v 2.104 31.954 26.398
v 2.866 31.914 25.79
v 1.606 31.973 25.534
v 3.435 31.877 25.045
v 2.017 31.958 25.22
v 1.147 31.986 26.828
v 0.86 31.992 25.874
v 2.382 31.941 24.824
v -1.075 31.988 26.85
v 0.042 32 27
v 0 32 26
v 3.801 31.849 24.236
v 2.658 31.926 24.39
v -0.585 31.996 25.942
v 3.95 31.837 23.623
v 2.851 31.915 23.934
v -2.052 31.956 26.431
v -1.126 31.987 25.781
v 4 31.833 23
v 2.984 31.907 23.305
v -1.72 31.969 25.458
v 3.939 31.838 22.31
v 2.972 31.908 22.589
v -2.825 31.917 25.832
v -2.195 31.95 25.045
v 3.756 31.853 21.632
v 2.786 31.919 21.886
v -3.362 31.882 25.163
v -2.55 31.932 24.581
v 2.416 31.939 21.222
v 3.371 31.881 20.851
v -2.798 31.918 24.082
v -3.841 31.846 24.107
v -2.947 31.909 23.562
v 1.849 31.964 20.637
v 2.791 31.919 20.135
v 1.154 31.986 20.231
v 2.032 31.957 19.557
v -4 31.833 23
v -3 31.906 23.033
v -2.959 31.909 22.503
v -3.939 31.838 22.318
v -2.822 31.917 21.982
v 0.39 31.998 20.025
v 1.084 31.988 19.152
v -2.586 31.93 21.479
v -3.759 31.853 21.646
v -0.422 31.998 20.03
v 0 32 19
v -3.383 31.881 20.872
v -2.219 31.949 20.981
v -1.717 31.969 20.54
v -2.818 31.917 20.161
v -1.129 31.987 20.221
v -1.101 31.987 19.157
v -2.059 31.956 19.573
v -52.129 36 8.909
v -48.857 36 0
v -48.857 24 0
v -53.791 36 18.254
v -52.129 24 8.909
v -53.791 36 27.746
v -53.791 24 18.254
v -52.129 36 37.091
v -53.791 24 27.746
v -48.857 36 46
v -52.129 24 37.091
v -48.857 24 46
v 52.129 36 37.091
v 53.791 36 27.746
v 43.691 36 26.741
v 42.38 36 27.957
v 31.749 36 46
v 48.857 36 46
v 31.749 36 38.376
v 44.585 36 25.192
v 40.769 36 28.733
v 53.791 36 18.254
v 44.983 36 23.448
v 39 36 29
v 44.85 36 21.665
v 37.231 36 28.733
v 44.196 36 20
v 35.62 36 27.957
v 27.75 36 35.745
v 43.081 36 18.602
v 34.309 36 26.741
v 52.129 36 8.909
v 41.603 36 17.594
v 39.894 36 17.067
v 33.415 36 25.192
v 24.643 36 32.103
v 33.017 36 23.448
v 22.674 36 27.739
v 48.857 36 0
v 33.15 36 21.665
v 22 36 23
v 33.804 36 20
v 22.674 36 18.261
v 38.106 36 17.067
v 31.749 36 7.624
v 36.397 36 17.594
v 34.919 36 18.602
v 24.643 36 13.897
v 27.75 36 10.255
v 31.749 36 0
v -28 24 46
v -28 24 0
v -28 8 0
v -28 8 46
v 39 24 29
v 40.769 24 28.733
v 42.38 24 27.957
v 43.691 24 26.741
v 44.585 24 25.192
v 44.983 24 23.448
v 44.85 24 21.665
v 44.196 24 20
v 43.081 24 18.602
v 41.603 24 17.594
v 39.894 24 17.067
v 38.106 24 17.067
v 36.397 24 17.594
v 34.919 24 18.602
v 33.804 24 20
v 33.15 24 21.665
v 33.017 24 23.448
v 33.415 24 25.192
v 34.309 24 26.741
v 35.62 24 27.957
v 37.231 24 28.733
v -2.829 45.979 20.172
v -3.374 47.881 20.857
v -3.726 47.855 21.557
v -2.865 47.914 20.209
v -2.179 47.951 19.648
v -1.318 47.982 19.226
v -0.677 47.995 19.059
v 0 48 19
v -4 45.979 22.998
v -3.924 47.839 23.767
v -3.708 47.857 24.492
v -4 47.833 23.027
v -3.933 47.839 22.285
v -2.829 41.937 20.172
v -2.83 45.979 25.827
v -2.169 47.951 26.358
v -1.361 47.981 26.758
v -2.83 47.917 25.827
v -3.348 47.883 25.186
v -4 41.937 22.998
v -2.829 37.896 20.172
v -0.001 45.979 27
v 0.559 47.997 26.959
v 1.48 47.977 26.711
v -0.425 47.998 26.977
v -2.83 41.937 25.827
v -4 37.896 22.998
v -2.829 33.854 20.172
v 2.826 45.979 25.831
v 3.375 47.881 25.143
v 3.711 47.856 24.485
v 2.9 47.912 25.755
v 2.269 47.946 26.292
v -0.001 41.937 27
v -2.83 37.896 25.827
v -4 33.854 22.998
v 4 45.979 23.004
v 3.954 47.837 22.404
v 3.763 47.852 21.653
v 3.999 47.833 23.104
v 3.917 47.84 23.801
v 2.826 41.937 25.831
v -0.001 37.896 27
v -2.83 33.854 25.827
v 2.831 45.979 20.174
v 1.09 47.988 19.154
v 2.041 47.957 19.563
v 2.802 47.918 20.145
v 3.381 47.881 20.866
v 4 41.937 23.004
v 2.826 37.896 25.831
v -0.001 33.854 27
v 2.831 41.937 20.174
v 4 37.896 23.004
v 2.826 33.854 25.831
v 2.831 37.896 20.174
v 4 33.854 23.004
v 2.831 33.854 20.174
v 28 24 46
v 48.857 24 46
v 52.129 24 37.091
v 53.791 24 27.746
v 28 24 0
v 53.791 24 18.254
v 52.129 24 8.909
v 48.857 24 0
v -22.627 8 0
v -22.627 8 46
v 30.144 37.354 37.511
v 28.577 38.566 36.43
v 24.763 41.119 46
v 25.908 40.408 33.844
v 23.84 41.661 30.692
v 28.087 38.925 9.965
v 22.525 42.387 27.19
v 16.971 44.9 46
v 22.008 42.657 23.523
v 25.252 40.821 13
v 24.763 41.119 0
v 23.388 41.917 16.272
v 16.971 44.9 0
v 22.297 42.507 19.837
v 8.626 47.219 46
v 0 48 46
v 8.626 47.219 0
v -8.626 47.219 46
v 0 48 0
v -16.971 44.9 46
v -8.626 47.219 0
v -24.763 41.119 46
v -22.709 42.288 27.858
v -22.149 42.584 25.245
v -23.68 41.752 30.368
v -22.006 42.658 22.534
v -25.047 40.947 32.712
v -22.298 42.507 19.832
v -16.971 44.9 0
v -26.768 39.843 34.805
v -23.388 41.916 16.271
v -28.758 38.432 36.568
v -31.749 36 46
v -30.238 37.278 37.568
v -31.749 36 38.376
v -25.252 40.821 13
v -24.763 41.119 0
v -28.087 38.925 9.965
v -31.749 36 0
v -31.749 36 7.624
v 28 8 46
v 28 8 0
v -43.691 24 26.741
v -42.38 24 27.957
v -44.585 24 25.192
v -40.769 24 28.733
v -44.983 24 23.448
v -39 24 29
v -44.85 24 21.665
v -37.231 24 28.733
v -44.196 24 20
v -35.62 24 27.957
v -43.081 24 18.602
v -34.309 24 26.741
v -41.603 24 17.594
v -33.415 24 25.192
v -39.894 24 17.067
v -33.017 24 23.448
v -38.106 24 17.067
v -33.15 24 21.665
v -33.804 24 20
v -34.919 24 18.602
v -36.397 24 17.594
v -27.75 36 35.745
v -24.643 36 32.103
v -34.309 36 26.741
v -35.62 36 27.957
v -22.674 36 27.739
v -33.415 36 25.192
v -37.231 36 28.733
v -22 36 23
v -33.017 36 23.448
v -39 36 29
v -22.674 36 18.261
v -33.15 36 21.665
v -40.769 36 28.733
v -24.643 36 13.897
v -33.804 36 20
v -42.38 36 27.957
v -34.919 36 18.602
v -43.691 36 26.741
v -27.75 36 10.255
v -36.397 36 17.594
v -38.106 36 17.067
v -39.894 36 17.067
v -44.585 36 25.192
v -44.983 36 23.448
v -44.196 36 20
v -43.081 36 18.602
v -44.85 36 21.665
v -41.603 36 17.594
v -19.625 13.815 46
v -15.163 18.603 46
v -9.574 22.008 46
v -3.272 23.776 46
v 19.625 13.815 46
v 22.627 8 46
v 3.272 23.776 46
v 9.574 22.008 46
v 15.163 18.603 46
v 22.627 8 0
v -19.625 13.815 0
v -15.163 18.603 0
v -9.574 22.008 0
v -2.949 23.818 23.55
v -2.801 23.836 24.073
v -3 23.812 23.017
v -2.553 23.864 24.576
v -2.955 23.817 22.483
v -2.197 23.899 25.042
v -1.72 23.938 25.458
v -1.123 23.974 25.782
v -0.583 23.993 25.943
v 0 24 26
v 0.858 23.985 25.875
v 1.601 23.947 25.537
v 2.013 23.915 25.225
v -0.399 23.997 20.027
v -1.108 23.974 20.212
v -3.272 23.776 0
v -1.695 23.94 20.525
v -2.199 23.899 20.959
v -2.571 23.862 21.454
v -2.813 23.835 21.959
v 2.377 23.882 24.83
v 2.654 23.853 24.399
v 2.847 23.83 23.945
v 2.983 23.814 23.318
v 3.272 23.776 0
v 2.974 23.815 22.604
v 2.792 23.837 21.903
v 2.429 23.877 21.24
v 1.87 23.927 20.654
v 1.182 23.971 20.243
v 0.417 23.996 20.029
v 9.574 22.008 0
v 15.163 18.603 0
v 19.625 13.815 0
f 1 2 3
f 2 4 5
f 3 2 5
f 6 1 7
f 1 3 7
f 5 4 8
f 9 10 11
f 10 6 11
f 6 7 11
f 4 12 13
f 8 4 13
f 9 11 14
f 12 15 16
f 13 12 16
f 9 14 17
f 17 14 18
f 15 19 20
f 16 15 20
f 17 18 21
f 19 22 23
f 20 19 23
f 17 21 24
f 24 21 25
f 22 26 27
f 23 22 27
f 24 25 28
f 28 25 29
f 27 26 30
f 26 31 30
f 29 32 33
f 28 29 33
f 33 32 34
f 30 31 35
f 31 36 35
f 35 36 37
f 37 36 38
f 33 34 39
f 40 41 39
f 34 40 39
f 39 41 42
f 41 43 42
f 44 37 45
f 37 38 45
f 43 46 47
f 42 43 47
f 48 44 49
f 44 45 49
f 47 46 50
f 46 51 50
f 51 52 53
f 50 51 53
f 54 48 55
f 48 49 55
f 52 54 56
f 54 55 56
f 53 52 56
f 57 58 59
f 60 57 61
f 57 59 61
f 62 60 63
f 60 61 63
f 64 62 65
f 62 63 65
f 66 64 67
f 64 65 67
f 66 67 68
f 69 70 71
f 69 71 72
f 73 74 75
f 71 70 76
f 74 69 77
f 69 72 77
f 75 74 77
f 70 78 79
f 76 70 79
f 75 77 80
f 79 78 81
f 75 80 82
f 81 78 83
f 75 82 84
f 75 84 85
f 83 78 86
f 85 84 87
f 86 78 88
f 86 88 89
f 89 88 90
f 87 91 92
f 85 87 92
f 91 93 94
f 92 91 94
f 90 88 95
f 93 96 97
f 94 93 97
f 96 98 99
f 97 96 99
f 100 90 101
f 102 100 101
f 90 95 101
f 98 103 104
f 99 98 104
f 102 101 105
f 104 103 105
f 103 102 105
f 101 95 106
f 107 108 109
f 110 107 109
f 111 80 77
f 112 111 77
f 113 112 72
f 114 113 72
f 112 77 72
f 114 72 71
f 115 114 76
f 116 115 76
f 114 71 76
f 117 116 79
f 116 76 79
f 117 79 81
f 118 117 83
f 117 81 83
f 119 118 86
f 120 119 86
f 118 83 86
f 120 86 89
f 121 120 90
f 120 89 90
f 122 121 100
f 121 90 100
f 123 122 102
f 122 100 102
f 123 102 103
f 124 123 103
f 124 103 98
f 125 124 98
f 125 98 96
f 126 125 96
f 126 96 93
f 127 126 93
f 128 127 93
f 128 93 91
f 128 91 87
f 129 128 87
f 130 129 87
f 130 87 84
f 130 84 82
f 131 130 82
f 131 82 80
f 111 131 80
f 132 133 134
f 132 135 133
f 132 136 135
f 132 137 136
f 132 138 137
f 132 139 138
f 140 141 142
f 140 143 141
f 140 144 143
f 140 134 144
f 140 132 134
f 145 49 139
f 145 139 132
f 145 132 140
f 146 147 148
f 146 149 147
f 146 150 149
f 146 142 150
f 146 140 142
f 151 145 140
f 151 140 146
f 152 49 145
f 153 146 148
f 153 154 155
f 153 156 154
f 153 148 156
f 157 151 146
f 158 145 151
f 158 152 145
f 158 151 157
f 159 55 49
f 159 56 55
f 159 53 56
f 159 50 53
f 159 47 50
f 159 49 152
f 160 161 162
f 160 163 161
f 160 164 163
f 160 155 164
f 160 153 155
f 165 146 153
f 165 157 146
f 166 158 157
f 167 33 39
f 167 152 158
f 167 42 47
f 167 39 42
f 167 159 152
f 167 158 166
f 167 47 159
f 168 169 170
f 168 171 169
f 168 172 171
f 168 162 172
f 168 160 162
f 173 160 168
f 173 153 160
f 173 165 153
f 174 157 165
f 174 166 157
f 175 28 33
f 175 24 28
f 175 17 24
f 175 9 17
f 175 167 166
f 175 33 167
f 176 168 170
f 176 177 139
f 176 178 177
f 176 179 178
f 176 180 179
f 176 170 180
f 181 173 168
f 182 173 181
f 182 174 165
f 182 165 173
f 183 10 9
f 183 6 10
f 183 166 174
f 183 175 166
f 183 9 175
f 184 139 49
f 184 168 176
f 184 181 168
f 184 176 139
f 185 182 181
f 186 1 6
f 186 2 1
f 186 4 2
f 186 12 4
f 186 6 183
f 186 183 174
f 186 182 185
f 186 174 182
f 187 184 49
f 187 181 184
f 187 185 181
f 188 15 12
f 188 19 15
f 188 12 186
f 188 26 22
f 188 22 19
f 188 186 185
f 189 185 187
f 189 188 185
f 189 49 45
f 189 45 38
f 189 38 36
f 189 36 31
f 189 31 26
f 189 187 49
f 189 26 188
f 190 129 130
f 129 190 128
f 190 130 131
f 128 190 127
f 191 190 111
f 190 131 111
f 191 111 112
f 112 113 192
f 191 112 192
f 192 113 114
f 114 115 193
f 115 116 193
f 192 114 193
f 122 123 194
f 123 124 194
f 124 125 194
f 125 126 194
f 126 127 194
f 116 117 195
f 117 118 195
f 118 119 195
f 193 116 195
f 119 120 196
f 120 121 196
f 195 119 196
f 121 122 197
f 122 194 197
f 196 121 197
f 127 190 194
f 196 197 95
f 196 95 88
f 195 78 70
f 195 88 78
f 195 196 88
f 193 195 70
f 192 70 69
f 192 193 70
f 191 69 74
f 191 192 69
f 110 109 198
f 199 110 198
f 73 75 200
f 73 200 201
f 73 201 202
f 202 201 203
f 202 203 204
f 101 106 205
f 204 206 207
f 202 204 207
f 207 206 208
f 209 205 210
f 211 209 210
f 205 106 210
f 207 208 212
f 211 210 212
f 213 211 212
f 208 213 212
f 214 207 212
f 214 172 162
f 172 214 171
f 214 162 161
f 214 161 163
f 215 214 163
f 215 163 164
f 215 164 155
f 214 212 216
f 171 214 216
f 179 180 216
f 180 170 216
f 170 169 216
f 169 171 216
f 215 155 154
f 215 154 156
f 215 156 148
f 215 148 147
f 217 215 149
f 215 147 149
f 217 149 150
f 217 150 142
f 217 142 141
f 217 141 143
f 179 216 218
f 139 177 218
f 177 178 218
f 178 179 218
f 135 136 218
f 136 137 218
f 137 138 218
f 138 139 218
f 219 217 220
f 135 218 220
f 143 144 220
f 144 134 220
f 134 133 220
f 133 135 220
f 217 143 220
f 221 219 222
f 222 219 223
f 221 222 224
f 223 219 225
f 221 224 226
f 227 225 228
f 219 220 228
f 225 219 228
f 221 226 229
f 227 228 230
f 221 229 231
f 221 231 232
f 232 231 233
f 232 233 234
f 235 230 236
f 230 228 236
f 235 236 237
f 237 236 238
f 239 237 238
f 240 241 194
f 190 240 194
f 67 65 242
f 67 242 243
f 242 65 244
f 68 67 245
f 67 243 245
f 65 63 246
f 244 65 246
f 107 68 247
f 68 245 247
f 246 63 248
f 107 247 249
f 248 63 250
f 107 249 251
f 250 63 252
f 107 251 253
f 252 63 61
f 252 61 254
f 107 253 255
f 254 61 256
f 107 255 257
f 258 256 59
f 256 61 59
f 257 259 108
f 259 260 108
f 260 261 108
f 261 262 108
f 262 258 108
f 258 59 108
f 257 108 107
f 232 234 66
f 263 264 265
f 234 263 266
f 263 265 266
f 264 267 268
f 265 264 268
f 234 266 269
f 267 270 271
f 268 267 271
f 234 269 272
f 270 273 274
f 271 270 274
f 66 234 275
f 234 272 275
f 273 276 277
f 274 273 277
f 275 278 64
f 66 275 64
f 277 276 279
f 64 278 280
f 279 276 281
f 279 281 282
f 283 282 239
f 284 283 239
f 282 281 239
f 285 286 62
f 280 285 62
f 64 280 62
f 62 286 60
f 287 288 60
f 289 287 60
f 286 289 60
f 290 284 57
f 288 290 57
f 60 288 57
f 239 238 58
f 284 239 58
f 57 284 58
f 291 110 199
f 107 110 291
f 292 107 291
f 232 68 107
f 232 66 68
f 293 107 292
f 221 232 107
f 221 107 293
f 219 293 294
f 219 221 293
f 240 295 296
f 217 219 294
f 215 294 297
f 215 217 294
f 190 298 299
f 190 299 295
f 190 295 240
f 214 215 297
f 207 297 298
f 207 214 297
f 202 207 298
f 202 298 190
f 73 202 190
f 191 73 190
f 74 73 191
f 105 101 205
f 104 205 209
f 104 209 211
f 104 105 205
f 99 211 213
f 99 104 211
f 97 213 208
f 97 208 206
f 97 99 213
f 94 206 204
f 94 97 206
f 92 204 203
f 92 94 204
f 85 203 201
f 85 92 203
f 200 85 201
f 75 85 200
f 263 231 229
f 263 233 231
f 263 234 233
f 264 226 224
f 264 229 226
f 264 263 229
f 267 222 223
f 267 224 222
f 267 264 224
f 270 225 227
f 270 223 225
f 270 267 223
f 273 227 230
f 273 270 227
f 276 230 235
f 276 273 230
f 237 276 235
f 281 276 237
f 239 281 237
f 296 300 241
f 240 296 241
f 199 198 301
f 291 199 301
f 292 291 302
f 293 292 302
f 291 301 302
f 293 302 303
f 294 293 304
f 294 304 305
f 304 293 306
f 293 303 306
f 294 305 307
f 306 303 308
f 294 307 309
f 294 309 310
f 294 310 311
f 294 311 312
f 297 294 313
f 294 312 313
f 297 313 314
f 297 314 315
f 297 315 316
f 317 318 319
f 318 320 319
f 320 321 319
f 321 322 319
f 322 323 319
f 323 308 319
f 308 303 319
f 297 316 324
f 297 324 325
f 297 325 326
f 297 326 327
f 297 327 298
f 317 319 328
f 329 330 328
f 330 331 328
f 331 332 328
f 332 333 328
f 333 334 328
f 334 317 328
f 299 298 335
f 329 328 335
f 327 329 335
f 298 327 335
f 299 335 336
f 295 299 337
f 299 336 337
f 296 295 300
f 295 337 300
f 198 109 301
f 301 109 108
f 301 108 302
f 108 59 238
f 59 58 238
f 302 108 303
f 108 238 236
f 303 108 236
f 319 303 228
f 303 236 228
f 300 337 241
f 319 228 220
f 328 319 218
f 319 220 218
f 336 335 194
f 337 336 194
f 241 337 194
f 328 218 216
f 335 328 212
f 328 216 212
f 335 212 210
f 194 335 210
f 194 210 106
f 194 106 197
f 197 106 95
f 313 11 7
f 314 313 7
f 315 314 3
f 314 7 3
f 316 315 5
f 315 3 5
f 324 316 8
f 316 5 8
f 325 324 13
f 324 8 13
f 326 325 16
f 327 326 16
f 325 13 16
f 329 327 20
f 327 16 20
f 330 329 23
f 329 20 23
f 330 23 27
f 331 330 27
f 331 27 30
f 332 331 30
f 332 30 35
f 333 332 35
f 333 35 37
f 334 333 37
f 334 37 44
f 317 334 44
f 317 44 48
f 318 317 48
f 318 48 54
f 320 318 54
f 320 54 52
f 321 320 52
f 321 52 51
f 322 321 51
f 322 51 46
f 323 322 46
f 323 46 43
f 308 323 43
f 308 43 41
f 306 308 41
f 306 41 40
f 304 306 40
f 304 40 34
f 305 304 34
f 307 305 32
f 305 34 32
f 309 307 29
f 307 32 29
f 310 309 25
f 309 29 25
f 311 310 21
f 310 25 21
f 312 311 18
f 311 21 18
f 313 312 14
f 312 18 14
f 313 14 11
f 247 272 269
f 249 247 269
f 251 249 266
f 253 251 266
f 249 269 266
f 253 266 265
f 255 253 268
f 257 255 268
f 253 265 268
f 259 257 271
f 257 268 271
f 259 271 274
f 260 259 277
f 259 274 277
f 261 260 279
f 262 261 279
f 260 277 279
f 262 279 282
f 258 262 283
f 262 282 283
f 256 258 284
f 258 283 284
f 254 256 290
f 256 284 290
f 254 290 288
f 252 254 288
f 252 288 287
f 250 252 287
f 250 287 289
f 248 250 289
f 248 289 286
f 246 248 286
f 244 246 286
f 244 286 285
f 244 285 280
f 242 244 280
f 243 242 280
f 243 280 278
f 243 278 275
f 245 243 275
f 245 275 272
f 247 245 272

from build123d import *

# Parameters (mm, degrees)
BOSS_EXTRUDE1_DEPTH  = 46
CUT_EXTRUDE1_START   = -4.166957121
CUT_EXTRUDE1_DEPTH   = 17.166957121
CUT_EXTRUDE1_START_2 = 18
CUT_EXTRUDE1_2_DEPTH = 10
SKETCH4_R            = 3
CUT_EXTRUDE2_DEPTH   = 77.26270392
SKETCH5_R            = 17
CUT_EXTRUDE3_DEPTH   = 77.262703957
SKETCH6_R            = 6
CUT_EXTRUDE4_DEPTH   = 77.262703957
CUT_EXTRUDE5_DEPTH   = 86.650452531


with BuildPart() as part:
    # Sketch1 → Boss-Extrude1 (new body)
    with BuildSketch(Plane.XY):
        with BuildLine():
            Line((-28, 8), (-22.627416998, 8))
            ThreePointArc((-22.627416998, 8), (0, 24), (22.627416998, 8))
            Line((22.627416998, 8), (28, 8))
            Line((28, 8), (28, 24))
            Line((28, 24), (54, 24))
            Line((54, 24), (54, 36))
            Line((54, 36), (31.749015733, 36))
            ThreePointArc((31.749015733, 36), (0, 48), (-31.749015733, 36))
            Line((-31.749015733, 36), (-54, 36))
            Line((-54, 36), (-54, 24))
            Line((-54, 24), (-28, 24))
            Line((-28, 24), (-28, 8))
        make_face()
    extrude(amount=BOSS_EXTRUDE1_DEPTH)

    # Cut-Extrude1: read off the stored shape, not the designer's step
    # Cut-Extrude1 outline → Cut-Extrude1 (cut)
    with BuildSketch(Plane(origin=(0, 36, 0), x_dir=(1, 0, 0), z_dir=(0, 1, 0)).offset(CUT_EXTRUDE1_START)):
        with BuildLine():
            add(Edge.make_bspline(
                [(0, -19), (-1.057527997, -19), (-2.091087742, -19.434088276), (-3.566323367, -20.909614388), (-3.999433765, -21.953884044), (-4.00056506, -24.04178128), (-3.576219278, -25.07994956), (-2.083227921, -26.574310552), (-1.045821073, -26.9996204), (1.042915307, -27.000379072), (2.087446575, -26.567981834), (3.563947107, -25.094327717), (3.998968512, -24.060310778), (4.001027689, -21.947486084), (3.568016054, -20.912331491), (2.093312914, -19.435292521), (1.057527997, -19), (0, -19)],
                knots=[0, 0, 0, 0, 0.125, 0.125, 0.25, 0.25, 0.375, 0.375, 0.5, 0.5, 0.625, 0.625, 0.75, 0.75, 0.875, 0.875, 1, 1, 1, 1], degree=3))
        make_face()
    extrude(amount=CUT_EXTRUDE1_DEPTH, mode=Mode.SUBTRACT)

    # Cut-Extrude1 2 outline → Cut-Extrude1 2 (add)
    with BuildSketch(Plane.XY.offset(CUT_EXTRUDE1_START_2)):
        with BuildLine():
            ThreePointArc((4.00000004, 31.83304297), (-2.3e-08, 32), (-4.000000085, 31.833042966))
            Line((-4.000000085, 31.833042966), (4.00000004, 31.83304297))
        make_face()
    extrude(amount=CUT_EXTRUDE1_2_DEPTH)

    # Sketch4 → Cut-Extrude2 (cut, through all)
    with BuildSketch(Plane(origin=(0, 36, 0), x_dir=(1, 0, 0), z_dir=(0, 1, 0))):
        with Locations(Location((0, -23, 0), (0, 0, 270))):
            Circle(SKETCH4_R)
    extrude(amount=-CUT_EXTRUDE2_DEPTH, mode=Mode.SUBTRACT)

    # Sketch5 → Cut-Extrude3 (cut, through all)
    with BuildSketch(Plane(origin=(0, 36, 0), x_dir=(1, 0, 0), z_dir=(0, 1, 0))):
        with Locations((-39, -23)):
            Circle(SKETCH5_R)
        with Locations((39, -23)):
            Circle(SKETCH5_R)
    extrude(amount=CUT_EXTRUDE3_DEPTH, mode=Mode.SUBTRACT)

    # Sketch6 → Cut-Extrude4 (cut, through all)
    with BuildSketch(Plane(origin=(0, 36, 0), x_dir=(1, 0, 0), z_dir=(0, 1, 0))):
        with Locations(Location((-39, -23, 0), (0, 0, 270))):
            Circle(SKETCH6_R)
        with Locations(Location((39, -23, 0), (0, 0, 270))):
            Circle(SKETCH6_R)
    extrude(amount=-CUT_EXTRUDE4_DEPTH, mode=Mode.SUBTRACT)

    # Sketch8 → Cut-Extrude5 (cut, through all)
    with BuildSketch(Plane(origin=(0, 0, 0), x_dir=(1, 0, 0), z_dir=(0, 1, 0))):
        with BuildLine():
            Line((-48.61841215, -46.5), (-63.61841215, -46.5))
            Line((-63.61841215, -46.5), (-63.61841215, 0.5))
            Line((-63.61841215, 0.5), (-48.61841215, 0.5))
            ThreePointArc((-48.61841215, 0.5), (-54, -23), (-48.61841215, -46.5))
        make_face()
    cut_extrude5 = extrude(amount=CUT_EXTRUDE5_DEPTH, mode=Mode.SUBTRACT)

    # Mirror1: Cut-Extrude5 across plane
    add(cut_extrude5.mirror(Plane(origin=(0, 0, 0), x_dir=(0, 0, 1), z_dir=(1, 0, 0))), mode=Mode.SUBTRACT)


solid = part.part
